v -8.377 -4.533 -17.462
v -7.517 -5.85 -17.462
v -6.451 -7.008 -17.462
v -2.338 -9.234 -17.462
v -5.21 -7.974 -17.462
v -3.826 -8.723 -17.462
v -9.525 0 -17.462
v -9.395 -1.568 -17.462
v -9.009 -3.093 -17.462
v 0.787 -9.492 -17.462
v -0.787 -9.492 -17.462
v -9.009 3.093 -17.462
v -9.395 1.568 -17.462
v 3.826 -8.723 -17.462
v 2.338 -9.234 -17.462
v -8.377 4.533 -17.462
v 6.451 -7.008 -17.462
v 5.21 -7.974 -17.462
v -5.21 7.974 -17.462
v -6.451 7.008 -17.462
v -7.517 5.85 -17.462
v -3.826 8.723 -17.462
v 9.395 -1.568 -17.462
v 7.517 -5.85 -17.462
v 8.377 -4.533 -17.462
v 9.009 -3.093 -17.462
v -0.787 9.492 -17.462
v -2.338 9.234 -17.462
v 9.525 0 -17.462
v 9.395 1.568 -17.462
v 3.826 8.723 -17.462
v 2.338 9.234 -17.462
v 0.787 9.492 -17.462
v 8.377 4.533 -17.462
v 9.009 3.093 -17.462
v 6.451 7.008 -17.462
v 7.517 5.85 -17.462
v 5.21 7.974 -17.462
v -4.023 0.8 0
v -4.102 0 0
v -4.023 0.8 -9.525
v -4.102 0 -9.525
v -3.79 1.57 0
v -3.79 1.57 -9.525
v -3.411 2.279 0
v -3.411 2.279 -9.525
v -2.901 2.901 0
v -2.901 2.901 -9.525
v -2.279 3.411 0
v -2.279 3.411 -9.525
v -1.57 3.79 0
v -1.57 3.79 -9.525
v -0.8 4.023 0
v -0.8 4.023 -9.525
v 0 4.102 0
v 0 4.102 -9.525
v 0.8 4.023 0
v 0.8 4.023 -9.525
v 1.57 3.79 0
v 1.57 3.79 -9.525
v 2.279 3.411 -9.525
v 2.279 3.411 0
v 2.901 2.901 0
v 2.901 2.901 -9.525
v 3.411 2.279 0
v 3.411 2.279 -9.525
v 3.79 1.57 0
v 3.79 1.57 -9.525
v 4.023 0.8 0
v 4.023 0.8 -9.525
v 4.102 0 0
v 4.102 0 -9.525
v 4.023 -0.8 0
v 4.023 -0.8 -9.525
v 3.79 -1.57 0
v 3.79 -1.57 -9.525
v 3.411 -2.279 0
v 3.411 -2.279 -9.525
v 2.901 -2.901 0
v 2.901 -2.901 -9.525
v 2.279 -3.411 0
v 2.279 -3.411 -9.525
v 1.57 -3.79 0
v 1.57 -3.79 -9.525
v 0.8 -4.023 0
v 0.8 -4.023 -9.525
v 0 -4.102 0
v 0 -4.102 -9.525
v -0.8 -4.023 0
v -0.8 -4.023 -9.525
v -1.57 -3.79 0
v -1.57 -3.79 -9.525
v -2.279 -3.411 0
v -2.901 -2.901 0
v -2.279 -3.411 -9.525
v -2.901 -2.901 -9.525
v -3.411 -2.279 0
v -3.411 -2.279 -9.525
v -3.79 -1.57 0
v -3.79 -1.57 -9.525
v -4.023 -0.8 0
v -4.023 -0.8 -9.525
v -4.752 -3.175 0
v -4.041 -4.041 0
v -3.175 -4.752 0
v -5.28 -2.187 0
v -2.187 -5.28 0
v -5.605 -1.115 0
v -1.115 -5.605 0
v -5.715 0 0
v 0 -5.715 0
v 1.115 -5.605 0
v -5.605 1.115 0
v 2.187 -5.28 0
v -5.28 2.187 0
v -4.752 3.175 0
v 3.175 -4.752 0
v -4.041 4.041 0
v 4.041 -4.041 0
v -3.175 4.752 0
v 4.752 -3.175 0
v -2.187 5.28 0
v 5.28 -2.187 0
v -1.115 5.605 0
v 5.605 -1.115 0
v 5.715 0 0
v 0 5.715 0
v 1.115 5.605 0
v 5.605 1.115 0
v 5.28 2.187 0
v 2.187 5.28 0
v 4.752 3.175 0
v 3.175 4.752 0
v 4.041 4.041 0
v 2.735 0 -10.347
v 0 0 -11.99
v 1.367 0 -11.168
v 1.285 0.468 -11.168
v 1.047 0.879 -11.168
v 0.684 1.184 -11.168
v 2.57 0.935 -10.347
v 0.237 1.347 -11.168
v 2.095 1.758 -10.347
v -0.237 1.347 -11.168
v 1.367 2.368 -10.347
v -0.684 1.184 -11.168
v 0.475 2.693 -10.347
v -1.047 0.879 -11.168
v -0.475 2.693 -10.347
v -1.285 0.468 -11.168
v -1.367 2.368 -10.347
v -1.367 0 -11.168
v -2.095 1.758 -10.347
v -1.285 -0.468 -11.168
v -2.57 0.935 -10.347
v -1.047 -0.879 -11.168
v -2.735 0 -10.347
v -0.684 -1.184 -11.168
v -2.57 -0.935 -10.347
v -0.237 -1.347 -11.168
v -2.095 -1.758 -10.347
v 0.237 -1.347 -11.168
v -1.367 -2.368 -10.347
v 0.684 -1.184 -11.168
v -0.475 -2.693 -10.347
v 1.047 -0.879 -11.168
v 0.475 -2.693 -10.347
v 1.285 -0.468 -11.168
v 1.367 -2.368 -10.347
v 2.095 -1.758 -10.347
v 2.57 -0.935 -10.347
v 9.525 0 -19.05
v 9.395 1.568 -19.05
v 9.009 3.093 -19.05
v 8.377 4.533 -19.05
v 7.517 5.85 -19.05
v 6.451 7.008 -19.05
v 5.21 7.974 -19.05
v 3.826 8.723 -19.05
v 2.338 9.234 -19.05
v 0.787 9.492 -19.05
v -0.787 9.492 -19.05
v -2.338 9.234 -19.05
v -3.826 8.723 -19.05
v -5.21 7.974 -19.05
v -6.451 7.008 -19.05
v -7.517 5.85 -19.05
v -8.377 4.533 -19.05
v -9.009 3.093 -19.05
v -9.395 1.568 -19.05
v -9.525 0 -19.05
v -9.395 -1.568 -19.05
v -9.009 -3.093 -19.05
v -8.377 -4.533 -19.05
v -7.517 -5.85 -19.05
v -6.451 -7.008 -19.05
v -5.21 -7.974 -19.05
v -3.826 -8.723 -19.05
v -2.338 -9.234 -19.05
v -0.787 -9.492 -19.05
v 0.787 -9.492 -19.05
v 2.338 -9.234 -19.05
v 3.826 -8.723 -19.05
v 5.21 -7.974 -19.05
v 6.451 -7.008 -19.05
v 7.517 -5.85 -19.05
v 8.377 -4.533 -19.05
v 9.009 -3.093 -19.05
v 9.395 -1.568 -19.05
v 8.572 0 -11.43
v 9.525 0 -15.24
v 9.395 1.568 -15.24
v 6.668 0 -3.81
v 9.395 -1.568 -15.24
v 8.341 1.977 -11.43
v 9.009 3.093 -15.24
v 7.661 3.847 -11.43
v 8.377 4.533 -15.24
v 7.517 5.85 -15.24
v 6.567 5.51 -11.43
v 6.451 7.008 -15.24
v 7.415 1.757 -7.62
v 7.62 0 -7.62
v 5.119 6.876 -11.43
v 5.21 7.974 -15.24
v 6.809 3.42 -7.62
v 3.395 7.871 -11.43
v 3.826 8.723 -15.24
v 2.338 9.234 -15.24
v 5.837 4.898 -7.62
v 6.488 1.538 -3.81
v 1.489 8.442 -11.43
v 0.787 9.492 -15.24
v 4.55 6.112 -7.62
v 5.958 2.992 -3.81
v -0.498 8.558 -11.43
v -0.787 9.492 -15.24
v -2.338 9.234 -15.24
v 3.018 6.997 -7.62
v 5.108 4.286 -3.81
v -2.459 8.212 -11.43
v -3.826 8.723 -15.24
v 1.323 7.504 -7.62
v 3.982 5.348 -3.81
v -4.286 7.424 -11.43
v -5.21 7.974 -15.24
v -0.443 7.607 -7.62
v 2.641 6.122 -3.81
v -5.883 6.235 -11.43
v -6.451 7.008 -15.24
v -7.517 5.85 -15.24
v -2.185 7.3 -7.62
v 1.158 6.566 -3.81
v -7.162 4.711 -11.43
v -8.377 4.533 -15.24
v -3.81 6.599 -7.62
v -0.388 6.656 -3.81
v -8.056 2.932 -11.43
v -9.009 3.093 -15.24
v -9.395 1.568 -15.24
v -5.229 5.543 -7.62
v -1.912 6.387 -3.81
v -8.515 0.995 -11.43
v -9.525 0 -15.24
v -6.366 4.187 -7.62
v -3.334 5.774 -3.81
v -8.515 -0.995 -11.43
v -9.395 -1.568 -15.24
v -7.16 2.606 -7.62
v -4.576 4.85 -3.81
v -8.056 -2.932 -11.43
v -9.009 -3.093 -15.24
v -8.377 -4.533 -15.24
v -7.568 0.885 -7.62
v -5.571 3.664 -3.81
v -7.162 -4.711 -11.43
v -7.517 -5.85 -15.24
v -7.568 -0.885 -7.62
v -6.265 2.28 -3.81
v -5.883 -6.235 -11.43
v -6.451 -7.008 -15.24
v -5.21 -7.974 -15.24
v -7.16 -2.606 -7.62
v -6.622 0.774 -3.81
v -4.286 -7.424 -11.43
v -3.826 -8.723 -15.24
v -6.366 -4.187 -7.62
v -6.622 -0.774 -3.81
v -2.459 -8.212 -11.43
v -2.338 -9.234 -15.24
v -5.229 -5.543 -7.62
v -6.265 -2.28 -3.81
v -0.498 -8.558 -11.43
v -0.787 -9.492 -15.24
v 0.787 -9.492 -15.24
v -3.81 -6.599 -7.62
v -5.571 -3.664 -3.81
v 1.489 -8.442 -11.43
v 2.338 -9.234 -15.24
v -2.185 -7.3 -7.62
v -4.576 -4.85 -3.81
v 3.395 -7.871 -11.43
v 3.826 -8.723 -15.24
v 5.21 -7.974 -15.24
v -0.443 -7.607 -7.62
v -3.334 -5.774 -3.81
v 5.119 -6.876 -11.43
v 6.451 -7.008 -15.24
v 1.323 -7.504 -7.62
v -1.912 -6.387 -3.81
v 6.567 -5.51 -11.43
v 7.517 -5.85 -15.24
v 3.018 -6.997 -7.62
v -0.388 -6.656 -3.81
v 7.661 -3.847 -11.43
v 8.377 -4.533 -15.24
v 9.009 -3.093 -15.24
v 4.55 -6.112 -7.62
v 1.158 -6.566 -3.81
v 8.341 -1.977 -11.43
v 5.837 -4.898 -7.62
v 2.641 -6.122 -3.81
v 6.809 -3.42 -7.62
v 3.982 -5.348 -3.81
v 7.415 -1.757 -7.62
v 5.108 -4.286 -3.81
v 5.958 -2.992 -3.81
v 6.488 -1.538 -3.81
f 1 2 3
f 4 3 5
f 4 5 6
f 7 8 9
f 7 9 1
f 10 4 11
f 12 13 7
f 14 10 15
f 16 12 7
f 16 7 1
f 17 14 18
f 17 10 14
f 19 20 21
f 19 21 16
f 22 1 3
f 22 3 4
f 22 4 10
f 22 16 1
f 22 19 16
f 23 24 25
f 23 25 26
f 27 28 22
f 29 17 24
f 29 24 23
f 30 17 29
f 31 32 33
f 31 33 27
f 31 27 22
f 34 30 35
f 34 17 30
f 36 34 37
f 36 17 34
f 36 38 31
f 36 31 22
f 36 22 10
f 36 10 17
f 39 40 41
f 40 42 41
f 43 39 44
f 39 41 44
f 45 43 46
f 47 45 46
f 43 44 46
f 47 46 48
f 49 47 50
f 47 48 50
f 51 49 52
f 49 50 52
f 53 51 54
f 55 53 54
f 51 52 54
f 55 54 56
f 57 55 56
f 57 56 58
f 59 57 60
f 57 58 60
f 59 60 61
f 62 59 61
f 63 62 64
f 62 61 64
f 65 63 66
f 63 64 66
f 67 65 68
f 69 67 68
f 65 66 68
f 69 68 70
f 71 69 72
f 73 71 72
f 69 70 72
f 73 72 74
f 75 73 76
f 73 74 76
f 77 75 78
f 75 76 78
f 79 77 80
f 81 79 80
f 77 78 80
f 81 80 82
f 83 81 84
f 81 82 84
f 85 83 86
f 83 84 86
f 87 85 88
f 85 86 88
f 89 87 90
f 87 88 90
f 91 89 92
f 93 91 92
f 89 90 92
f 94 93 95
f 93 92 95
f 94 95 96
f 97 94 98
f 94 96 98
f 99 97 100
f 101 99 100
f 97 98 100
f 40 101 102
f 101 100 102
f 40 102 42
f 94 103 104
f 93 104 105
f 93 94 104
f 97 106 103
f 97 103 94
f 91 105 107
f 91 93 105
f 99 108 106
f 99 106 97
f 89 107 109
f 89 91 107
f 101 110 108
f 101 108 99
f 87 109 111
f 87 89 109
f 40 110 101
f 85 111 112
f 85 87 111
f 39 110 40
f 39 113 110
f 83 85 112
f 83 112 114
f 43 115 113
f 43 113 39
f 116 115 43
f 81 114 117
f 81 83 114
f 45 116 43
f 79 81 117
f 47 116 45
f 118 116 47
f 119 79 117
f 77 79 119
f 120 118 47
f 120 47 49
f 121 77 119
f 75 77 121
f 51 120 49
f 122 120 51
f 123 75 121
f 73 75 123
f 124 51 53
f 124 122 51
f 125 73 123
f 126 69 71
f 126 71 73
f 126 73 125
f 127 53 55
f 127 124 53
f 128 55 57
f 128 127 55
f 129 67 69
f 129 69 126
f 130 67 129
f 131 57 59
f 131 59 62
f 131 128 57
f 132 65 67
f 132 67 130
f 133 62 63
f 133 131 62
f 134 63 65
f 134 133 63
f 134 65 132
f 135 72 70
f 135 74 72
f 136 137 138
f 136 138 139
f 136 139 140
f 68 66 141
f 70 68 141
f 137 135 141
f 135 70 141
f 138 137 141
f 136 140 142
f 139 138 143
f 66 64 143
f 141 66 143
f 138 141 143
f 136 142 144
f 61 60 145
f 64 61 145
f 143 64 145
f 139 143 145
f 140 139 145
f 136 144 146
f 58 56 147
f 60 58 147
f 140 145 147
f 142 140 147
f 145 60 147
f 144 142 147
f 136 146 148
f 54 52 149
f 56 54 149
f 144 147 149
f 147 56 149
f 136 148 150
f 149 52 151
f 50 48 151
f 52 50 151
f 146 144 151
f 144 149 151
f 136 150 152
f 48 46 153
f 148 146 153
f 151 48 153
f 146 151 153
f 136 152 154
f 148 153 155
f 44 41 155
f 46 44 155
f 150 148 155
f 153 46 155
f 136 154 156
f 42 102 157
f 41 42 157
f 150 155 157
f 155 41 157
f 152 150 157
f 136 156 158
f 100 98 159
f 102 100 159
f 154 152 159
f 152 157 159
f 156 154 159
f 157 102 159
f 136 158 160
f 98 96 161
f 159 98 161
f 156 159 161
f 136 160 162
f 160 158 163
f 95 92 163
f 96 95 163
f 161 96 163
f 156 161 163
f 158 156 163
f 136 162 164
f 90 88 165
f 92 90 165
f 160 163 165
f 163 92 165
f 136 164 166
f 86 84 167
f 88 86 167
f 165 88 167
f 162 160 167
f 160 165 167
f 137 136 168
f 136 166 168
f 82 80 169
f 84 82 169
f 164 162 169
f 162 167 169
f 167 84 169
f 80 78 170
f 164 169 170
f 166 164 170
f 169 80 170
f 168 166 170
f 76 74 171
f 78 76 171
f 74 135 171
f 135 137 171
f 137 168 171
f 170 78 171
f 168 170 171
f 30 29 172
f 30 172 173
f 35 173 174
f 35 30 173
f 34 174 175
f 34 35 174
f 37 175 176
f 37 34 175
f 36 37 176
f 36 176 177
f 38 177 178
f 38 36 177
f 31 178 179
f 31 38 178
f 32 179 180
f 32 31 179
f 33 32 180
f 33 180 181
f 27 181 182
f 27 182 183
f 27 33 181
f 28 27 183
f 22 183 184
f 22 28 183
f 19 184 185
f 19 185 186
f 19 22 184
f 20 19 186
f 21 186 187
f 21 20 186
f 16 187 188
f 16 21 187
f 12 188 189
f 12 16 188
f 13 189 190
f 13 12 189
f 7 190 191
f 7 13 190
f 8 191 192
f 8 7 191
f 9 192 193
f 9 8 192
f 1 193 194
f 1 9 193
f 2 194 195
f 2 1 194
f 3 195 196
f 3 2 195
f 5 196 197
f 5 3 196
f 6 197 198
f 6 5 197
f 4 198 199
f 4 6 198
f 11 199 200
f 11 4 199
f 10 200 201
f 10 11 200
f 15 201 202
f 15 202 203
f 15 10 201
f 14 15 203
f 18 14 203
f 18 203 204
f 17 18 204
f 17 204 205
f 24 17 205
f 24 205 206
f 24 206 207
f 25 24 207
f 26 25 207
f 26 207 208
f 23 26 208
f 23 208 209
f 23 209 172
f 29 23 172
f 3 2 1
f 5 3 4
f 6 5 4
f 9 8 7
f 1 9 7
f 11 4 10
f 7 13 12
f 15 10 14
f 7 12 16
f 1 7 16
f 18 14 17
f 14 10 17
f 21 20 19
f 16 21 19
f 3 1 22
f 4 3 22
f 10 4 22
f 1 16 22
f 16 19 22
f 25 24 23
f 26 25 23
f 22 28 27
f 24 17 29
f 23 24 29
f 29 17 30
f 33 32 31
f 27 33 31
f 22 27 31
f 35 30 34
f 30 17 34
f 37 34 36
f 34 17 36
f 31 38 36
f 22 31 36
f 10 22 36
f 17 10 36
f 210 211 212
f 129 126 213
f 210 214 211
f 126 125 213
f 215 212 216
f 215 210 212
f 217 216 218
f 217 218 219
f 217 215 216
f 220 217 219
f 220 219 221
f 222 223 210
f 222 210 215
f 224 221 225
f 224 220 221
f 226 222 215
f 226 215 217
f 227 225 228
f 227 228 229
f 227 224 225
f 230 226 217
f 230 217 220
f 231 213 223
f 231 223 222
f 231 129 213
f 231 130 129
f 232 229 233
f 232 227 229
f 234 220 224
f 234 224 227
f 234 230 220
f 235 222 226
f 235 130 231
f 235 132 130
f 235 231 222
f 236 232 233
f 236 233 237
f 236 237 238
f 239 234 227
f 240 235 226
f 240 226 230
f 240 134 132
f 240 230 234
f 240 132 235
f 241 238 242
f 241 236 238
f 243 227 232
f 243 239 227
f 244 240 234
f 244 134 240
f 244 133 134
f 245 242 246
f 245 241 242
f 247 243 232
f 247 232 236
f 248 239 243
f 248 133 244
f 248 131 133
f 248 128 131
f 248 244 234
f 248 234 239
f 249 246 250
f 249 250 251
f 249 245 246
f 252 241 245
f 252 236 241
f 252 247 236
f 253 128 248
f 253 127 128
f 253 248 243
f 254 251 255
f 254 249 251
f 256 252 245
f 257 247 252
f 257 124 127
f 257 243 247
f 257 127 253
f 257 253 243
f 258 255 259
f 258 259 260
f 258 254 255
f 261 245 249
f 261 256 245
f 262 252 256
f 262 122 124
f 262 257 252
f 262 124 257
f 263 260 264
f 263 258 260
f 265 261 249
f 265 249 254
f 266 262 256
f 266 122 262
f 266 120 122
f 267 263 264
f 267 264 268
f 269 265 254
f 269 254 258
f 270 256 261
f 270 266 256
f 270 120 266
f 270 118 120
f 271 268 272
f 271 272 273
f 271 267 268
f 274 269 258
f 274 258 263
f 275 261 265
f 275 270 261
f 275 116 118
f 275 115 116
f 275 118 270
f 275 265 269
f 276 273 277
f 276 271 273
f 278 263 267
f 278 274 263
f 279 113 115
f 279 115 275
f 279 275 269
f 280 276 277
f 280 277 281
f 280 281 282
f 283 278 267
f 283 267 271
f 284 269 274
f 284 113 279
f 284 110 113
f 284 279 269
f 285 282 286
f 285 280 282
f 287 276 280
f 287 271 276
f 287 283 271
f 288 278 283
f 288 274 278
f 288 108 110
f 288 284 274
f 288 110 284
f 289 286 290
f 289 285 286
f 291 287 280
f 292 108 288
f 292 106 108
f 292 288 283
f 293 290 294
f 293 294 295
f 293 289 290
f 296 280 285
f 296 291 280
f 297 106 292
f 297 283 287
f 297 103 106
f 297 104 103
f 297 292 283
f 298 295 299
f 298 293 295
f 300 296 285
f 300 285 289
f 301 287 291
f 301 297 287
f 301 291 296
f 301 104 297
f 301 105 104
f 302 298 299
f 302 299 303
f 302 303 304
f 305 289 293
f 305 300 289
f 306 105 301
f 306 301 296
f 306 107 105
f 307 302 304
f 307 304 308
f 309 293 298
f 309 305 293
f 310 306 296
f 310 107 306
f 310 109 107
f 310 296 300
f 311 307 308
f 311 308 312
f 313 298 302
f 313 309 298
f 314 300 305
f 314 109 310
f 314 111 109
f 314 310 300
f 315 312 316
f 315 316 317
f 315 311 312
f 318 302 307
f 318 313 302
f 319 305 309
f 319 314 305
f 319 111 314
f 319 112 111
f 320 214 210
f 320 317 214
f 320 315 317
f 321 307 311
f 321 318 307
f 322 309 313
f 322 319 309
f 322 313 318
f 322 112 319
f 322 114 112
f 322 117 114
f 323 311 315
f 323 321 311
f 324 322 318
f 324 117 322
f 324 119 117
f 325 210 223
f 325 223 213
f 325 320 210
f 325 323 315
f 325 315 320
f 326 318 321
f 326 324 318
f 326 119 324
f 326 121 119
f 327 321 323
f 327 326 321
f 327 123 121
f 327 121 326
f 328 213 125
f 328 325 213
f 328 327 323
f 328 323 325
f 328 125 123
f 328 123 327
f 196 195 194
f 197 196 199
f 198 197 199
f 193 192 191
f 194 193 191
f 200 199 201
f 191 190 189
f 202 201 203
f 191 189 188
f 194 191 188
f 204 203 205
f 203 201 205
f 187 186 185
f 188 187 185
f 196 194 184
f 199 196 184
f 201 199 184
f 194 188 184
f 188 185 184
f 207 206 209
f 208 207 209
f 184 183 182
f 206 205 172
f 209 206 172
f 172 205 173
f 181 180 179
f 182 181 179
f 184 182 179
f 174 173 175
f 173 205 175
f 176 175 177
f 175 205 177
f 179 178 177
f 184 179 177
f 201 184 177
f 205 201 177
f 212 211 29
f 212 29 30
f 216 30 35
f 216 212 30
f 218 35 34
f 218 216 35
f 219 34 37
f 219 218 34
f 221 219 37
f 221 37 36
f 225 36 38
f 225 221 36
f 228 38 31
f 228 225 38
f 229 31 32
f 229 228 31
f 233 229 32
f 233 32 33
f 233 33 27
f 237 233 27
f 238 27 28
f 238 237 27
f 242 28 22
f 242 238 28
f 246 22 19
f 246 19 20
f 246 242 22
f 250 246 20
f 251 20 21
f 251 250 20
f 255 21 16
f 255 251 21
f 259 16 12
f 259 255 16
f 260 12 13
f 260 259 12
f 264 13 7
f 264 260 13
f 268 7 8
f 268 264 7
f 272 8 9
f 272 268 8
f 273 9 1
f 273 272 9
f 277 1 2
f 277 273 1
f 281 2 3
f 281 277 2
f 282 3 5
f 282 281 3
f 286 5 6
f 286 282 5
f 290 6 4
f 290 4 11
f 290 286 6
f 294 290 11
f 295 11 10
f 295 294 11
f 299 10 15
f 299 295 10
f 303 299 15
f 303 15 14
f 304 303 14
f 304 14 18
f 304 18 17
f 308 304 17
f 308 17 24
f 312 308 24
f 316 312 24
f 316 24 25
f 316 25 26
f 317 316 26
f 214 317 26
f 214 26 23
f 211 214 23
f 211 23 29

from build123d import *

# Parameters (mm, degrees)
F0_R     = 9.525
F1_DEPTH = 17.4625
F2_START = -17.4625
F2_DEPTH = 1.5875
F3_D     = 8.2042
F3_DEPTH = 9.525
F3_TIP   = 2.4647903453
F4_SIZE2 = 3.81
F4_SIZE  = 15.24


with BuildPart() as f1:
    # F0 (on Top) → F1 (new body)
    with BuildSketch(Plane.XY):
        Circle(F0_R)
    extrude(amount=-F1_DEPTH)

    # F3
    with Locations(Plane.XY):
        with Locations((0, 0)):
            Hole(F3_D / 2, depth=F3_DEPTH)
            with Locations((0, 0, -(F3_DEPTH + F3_TIP / 2))):  # 118° drill point
                Cone(0, F3_D / 2, F3_TIP, mode=Mode.SUBTRACT)

    # F4
    f4_edges = [f1.edges().sort_by_distance(p)[0] for p in [
        (-9.525, 0, 0),
    ]]
    f4_side = f1.faces().sort_by_distance((-9.525, 0, -8.73125))[0]
    chamfer(f4_edges, length=F4_SIZE, length2=F4_SIZE2, reference=f4_side)


with BuildPart() as f2:
    # F0 (on Top) → F2 (new body)
    with BuildSketch(Plane.XY.offset(F2_START)):
        Circle(F0_R)
    extrude(amount=-F2_DEPTH)


solid = Compound([f1.part, f2.part])
